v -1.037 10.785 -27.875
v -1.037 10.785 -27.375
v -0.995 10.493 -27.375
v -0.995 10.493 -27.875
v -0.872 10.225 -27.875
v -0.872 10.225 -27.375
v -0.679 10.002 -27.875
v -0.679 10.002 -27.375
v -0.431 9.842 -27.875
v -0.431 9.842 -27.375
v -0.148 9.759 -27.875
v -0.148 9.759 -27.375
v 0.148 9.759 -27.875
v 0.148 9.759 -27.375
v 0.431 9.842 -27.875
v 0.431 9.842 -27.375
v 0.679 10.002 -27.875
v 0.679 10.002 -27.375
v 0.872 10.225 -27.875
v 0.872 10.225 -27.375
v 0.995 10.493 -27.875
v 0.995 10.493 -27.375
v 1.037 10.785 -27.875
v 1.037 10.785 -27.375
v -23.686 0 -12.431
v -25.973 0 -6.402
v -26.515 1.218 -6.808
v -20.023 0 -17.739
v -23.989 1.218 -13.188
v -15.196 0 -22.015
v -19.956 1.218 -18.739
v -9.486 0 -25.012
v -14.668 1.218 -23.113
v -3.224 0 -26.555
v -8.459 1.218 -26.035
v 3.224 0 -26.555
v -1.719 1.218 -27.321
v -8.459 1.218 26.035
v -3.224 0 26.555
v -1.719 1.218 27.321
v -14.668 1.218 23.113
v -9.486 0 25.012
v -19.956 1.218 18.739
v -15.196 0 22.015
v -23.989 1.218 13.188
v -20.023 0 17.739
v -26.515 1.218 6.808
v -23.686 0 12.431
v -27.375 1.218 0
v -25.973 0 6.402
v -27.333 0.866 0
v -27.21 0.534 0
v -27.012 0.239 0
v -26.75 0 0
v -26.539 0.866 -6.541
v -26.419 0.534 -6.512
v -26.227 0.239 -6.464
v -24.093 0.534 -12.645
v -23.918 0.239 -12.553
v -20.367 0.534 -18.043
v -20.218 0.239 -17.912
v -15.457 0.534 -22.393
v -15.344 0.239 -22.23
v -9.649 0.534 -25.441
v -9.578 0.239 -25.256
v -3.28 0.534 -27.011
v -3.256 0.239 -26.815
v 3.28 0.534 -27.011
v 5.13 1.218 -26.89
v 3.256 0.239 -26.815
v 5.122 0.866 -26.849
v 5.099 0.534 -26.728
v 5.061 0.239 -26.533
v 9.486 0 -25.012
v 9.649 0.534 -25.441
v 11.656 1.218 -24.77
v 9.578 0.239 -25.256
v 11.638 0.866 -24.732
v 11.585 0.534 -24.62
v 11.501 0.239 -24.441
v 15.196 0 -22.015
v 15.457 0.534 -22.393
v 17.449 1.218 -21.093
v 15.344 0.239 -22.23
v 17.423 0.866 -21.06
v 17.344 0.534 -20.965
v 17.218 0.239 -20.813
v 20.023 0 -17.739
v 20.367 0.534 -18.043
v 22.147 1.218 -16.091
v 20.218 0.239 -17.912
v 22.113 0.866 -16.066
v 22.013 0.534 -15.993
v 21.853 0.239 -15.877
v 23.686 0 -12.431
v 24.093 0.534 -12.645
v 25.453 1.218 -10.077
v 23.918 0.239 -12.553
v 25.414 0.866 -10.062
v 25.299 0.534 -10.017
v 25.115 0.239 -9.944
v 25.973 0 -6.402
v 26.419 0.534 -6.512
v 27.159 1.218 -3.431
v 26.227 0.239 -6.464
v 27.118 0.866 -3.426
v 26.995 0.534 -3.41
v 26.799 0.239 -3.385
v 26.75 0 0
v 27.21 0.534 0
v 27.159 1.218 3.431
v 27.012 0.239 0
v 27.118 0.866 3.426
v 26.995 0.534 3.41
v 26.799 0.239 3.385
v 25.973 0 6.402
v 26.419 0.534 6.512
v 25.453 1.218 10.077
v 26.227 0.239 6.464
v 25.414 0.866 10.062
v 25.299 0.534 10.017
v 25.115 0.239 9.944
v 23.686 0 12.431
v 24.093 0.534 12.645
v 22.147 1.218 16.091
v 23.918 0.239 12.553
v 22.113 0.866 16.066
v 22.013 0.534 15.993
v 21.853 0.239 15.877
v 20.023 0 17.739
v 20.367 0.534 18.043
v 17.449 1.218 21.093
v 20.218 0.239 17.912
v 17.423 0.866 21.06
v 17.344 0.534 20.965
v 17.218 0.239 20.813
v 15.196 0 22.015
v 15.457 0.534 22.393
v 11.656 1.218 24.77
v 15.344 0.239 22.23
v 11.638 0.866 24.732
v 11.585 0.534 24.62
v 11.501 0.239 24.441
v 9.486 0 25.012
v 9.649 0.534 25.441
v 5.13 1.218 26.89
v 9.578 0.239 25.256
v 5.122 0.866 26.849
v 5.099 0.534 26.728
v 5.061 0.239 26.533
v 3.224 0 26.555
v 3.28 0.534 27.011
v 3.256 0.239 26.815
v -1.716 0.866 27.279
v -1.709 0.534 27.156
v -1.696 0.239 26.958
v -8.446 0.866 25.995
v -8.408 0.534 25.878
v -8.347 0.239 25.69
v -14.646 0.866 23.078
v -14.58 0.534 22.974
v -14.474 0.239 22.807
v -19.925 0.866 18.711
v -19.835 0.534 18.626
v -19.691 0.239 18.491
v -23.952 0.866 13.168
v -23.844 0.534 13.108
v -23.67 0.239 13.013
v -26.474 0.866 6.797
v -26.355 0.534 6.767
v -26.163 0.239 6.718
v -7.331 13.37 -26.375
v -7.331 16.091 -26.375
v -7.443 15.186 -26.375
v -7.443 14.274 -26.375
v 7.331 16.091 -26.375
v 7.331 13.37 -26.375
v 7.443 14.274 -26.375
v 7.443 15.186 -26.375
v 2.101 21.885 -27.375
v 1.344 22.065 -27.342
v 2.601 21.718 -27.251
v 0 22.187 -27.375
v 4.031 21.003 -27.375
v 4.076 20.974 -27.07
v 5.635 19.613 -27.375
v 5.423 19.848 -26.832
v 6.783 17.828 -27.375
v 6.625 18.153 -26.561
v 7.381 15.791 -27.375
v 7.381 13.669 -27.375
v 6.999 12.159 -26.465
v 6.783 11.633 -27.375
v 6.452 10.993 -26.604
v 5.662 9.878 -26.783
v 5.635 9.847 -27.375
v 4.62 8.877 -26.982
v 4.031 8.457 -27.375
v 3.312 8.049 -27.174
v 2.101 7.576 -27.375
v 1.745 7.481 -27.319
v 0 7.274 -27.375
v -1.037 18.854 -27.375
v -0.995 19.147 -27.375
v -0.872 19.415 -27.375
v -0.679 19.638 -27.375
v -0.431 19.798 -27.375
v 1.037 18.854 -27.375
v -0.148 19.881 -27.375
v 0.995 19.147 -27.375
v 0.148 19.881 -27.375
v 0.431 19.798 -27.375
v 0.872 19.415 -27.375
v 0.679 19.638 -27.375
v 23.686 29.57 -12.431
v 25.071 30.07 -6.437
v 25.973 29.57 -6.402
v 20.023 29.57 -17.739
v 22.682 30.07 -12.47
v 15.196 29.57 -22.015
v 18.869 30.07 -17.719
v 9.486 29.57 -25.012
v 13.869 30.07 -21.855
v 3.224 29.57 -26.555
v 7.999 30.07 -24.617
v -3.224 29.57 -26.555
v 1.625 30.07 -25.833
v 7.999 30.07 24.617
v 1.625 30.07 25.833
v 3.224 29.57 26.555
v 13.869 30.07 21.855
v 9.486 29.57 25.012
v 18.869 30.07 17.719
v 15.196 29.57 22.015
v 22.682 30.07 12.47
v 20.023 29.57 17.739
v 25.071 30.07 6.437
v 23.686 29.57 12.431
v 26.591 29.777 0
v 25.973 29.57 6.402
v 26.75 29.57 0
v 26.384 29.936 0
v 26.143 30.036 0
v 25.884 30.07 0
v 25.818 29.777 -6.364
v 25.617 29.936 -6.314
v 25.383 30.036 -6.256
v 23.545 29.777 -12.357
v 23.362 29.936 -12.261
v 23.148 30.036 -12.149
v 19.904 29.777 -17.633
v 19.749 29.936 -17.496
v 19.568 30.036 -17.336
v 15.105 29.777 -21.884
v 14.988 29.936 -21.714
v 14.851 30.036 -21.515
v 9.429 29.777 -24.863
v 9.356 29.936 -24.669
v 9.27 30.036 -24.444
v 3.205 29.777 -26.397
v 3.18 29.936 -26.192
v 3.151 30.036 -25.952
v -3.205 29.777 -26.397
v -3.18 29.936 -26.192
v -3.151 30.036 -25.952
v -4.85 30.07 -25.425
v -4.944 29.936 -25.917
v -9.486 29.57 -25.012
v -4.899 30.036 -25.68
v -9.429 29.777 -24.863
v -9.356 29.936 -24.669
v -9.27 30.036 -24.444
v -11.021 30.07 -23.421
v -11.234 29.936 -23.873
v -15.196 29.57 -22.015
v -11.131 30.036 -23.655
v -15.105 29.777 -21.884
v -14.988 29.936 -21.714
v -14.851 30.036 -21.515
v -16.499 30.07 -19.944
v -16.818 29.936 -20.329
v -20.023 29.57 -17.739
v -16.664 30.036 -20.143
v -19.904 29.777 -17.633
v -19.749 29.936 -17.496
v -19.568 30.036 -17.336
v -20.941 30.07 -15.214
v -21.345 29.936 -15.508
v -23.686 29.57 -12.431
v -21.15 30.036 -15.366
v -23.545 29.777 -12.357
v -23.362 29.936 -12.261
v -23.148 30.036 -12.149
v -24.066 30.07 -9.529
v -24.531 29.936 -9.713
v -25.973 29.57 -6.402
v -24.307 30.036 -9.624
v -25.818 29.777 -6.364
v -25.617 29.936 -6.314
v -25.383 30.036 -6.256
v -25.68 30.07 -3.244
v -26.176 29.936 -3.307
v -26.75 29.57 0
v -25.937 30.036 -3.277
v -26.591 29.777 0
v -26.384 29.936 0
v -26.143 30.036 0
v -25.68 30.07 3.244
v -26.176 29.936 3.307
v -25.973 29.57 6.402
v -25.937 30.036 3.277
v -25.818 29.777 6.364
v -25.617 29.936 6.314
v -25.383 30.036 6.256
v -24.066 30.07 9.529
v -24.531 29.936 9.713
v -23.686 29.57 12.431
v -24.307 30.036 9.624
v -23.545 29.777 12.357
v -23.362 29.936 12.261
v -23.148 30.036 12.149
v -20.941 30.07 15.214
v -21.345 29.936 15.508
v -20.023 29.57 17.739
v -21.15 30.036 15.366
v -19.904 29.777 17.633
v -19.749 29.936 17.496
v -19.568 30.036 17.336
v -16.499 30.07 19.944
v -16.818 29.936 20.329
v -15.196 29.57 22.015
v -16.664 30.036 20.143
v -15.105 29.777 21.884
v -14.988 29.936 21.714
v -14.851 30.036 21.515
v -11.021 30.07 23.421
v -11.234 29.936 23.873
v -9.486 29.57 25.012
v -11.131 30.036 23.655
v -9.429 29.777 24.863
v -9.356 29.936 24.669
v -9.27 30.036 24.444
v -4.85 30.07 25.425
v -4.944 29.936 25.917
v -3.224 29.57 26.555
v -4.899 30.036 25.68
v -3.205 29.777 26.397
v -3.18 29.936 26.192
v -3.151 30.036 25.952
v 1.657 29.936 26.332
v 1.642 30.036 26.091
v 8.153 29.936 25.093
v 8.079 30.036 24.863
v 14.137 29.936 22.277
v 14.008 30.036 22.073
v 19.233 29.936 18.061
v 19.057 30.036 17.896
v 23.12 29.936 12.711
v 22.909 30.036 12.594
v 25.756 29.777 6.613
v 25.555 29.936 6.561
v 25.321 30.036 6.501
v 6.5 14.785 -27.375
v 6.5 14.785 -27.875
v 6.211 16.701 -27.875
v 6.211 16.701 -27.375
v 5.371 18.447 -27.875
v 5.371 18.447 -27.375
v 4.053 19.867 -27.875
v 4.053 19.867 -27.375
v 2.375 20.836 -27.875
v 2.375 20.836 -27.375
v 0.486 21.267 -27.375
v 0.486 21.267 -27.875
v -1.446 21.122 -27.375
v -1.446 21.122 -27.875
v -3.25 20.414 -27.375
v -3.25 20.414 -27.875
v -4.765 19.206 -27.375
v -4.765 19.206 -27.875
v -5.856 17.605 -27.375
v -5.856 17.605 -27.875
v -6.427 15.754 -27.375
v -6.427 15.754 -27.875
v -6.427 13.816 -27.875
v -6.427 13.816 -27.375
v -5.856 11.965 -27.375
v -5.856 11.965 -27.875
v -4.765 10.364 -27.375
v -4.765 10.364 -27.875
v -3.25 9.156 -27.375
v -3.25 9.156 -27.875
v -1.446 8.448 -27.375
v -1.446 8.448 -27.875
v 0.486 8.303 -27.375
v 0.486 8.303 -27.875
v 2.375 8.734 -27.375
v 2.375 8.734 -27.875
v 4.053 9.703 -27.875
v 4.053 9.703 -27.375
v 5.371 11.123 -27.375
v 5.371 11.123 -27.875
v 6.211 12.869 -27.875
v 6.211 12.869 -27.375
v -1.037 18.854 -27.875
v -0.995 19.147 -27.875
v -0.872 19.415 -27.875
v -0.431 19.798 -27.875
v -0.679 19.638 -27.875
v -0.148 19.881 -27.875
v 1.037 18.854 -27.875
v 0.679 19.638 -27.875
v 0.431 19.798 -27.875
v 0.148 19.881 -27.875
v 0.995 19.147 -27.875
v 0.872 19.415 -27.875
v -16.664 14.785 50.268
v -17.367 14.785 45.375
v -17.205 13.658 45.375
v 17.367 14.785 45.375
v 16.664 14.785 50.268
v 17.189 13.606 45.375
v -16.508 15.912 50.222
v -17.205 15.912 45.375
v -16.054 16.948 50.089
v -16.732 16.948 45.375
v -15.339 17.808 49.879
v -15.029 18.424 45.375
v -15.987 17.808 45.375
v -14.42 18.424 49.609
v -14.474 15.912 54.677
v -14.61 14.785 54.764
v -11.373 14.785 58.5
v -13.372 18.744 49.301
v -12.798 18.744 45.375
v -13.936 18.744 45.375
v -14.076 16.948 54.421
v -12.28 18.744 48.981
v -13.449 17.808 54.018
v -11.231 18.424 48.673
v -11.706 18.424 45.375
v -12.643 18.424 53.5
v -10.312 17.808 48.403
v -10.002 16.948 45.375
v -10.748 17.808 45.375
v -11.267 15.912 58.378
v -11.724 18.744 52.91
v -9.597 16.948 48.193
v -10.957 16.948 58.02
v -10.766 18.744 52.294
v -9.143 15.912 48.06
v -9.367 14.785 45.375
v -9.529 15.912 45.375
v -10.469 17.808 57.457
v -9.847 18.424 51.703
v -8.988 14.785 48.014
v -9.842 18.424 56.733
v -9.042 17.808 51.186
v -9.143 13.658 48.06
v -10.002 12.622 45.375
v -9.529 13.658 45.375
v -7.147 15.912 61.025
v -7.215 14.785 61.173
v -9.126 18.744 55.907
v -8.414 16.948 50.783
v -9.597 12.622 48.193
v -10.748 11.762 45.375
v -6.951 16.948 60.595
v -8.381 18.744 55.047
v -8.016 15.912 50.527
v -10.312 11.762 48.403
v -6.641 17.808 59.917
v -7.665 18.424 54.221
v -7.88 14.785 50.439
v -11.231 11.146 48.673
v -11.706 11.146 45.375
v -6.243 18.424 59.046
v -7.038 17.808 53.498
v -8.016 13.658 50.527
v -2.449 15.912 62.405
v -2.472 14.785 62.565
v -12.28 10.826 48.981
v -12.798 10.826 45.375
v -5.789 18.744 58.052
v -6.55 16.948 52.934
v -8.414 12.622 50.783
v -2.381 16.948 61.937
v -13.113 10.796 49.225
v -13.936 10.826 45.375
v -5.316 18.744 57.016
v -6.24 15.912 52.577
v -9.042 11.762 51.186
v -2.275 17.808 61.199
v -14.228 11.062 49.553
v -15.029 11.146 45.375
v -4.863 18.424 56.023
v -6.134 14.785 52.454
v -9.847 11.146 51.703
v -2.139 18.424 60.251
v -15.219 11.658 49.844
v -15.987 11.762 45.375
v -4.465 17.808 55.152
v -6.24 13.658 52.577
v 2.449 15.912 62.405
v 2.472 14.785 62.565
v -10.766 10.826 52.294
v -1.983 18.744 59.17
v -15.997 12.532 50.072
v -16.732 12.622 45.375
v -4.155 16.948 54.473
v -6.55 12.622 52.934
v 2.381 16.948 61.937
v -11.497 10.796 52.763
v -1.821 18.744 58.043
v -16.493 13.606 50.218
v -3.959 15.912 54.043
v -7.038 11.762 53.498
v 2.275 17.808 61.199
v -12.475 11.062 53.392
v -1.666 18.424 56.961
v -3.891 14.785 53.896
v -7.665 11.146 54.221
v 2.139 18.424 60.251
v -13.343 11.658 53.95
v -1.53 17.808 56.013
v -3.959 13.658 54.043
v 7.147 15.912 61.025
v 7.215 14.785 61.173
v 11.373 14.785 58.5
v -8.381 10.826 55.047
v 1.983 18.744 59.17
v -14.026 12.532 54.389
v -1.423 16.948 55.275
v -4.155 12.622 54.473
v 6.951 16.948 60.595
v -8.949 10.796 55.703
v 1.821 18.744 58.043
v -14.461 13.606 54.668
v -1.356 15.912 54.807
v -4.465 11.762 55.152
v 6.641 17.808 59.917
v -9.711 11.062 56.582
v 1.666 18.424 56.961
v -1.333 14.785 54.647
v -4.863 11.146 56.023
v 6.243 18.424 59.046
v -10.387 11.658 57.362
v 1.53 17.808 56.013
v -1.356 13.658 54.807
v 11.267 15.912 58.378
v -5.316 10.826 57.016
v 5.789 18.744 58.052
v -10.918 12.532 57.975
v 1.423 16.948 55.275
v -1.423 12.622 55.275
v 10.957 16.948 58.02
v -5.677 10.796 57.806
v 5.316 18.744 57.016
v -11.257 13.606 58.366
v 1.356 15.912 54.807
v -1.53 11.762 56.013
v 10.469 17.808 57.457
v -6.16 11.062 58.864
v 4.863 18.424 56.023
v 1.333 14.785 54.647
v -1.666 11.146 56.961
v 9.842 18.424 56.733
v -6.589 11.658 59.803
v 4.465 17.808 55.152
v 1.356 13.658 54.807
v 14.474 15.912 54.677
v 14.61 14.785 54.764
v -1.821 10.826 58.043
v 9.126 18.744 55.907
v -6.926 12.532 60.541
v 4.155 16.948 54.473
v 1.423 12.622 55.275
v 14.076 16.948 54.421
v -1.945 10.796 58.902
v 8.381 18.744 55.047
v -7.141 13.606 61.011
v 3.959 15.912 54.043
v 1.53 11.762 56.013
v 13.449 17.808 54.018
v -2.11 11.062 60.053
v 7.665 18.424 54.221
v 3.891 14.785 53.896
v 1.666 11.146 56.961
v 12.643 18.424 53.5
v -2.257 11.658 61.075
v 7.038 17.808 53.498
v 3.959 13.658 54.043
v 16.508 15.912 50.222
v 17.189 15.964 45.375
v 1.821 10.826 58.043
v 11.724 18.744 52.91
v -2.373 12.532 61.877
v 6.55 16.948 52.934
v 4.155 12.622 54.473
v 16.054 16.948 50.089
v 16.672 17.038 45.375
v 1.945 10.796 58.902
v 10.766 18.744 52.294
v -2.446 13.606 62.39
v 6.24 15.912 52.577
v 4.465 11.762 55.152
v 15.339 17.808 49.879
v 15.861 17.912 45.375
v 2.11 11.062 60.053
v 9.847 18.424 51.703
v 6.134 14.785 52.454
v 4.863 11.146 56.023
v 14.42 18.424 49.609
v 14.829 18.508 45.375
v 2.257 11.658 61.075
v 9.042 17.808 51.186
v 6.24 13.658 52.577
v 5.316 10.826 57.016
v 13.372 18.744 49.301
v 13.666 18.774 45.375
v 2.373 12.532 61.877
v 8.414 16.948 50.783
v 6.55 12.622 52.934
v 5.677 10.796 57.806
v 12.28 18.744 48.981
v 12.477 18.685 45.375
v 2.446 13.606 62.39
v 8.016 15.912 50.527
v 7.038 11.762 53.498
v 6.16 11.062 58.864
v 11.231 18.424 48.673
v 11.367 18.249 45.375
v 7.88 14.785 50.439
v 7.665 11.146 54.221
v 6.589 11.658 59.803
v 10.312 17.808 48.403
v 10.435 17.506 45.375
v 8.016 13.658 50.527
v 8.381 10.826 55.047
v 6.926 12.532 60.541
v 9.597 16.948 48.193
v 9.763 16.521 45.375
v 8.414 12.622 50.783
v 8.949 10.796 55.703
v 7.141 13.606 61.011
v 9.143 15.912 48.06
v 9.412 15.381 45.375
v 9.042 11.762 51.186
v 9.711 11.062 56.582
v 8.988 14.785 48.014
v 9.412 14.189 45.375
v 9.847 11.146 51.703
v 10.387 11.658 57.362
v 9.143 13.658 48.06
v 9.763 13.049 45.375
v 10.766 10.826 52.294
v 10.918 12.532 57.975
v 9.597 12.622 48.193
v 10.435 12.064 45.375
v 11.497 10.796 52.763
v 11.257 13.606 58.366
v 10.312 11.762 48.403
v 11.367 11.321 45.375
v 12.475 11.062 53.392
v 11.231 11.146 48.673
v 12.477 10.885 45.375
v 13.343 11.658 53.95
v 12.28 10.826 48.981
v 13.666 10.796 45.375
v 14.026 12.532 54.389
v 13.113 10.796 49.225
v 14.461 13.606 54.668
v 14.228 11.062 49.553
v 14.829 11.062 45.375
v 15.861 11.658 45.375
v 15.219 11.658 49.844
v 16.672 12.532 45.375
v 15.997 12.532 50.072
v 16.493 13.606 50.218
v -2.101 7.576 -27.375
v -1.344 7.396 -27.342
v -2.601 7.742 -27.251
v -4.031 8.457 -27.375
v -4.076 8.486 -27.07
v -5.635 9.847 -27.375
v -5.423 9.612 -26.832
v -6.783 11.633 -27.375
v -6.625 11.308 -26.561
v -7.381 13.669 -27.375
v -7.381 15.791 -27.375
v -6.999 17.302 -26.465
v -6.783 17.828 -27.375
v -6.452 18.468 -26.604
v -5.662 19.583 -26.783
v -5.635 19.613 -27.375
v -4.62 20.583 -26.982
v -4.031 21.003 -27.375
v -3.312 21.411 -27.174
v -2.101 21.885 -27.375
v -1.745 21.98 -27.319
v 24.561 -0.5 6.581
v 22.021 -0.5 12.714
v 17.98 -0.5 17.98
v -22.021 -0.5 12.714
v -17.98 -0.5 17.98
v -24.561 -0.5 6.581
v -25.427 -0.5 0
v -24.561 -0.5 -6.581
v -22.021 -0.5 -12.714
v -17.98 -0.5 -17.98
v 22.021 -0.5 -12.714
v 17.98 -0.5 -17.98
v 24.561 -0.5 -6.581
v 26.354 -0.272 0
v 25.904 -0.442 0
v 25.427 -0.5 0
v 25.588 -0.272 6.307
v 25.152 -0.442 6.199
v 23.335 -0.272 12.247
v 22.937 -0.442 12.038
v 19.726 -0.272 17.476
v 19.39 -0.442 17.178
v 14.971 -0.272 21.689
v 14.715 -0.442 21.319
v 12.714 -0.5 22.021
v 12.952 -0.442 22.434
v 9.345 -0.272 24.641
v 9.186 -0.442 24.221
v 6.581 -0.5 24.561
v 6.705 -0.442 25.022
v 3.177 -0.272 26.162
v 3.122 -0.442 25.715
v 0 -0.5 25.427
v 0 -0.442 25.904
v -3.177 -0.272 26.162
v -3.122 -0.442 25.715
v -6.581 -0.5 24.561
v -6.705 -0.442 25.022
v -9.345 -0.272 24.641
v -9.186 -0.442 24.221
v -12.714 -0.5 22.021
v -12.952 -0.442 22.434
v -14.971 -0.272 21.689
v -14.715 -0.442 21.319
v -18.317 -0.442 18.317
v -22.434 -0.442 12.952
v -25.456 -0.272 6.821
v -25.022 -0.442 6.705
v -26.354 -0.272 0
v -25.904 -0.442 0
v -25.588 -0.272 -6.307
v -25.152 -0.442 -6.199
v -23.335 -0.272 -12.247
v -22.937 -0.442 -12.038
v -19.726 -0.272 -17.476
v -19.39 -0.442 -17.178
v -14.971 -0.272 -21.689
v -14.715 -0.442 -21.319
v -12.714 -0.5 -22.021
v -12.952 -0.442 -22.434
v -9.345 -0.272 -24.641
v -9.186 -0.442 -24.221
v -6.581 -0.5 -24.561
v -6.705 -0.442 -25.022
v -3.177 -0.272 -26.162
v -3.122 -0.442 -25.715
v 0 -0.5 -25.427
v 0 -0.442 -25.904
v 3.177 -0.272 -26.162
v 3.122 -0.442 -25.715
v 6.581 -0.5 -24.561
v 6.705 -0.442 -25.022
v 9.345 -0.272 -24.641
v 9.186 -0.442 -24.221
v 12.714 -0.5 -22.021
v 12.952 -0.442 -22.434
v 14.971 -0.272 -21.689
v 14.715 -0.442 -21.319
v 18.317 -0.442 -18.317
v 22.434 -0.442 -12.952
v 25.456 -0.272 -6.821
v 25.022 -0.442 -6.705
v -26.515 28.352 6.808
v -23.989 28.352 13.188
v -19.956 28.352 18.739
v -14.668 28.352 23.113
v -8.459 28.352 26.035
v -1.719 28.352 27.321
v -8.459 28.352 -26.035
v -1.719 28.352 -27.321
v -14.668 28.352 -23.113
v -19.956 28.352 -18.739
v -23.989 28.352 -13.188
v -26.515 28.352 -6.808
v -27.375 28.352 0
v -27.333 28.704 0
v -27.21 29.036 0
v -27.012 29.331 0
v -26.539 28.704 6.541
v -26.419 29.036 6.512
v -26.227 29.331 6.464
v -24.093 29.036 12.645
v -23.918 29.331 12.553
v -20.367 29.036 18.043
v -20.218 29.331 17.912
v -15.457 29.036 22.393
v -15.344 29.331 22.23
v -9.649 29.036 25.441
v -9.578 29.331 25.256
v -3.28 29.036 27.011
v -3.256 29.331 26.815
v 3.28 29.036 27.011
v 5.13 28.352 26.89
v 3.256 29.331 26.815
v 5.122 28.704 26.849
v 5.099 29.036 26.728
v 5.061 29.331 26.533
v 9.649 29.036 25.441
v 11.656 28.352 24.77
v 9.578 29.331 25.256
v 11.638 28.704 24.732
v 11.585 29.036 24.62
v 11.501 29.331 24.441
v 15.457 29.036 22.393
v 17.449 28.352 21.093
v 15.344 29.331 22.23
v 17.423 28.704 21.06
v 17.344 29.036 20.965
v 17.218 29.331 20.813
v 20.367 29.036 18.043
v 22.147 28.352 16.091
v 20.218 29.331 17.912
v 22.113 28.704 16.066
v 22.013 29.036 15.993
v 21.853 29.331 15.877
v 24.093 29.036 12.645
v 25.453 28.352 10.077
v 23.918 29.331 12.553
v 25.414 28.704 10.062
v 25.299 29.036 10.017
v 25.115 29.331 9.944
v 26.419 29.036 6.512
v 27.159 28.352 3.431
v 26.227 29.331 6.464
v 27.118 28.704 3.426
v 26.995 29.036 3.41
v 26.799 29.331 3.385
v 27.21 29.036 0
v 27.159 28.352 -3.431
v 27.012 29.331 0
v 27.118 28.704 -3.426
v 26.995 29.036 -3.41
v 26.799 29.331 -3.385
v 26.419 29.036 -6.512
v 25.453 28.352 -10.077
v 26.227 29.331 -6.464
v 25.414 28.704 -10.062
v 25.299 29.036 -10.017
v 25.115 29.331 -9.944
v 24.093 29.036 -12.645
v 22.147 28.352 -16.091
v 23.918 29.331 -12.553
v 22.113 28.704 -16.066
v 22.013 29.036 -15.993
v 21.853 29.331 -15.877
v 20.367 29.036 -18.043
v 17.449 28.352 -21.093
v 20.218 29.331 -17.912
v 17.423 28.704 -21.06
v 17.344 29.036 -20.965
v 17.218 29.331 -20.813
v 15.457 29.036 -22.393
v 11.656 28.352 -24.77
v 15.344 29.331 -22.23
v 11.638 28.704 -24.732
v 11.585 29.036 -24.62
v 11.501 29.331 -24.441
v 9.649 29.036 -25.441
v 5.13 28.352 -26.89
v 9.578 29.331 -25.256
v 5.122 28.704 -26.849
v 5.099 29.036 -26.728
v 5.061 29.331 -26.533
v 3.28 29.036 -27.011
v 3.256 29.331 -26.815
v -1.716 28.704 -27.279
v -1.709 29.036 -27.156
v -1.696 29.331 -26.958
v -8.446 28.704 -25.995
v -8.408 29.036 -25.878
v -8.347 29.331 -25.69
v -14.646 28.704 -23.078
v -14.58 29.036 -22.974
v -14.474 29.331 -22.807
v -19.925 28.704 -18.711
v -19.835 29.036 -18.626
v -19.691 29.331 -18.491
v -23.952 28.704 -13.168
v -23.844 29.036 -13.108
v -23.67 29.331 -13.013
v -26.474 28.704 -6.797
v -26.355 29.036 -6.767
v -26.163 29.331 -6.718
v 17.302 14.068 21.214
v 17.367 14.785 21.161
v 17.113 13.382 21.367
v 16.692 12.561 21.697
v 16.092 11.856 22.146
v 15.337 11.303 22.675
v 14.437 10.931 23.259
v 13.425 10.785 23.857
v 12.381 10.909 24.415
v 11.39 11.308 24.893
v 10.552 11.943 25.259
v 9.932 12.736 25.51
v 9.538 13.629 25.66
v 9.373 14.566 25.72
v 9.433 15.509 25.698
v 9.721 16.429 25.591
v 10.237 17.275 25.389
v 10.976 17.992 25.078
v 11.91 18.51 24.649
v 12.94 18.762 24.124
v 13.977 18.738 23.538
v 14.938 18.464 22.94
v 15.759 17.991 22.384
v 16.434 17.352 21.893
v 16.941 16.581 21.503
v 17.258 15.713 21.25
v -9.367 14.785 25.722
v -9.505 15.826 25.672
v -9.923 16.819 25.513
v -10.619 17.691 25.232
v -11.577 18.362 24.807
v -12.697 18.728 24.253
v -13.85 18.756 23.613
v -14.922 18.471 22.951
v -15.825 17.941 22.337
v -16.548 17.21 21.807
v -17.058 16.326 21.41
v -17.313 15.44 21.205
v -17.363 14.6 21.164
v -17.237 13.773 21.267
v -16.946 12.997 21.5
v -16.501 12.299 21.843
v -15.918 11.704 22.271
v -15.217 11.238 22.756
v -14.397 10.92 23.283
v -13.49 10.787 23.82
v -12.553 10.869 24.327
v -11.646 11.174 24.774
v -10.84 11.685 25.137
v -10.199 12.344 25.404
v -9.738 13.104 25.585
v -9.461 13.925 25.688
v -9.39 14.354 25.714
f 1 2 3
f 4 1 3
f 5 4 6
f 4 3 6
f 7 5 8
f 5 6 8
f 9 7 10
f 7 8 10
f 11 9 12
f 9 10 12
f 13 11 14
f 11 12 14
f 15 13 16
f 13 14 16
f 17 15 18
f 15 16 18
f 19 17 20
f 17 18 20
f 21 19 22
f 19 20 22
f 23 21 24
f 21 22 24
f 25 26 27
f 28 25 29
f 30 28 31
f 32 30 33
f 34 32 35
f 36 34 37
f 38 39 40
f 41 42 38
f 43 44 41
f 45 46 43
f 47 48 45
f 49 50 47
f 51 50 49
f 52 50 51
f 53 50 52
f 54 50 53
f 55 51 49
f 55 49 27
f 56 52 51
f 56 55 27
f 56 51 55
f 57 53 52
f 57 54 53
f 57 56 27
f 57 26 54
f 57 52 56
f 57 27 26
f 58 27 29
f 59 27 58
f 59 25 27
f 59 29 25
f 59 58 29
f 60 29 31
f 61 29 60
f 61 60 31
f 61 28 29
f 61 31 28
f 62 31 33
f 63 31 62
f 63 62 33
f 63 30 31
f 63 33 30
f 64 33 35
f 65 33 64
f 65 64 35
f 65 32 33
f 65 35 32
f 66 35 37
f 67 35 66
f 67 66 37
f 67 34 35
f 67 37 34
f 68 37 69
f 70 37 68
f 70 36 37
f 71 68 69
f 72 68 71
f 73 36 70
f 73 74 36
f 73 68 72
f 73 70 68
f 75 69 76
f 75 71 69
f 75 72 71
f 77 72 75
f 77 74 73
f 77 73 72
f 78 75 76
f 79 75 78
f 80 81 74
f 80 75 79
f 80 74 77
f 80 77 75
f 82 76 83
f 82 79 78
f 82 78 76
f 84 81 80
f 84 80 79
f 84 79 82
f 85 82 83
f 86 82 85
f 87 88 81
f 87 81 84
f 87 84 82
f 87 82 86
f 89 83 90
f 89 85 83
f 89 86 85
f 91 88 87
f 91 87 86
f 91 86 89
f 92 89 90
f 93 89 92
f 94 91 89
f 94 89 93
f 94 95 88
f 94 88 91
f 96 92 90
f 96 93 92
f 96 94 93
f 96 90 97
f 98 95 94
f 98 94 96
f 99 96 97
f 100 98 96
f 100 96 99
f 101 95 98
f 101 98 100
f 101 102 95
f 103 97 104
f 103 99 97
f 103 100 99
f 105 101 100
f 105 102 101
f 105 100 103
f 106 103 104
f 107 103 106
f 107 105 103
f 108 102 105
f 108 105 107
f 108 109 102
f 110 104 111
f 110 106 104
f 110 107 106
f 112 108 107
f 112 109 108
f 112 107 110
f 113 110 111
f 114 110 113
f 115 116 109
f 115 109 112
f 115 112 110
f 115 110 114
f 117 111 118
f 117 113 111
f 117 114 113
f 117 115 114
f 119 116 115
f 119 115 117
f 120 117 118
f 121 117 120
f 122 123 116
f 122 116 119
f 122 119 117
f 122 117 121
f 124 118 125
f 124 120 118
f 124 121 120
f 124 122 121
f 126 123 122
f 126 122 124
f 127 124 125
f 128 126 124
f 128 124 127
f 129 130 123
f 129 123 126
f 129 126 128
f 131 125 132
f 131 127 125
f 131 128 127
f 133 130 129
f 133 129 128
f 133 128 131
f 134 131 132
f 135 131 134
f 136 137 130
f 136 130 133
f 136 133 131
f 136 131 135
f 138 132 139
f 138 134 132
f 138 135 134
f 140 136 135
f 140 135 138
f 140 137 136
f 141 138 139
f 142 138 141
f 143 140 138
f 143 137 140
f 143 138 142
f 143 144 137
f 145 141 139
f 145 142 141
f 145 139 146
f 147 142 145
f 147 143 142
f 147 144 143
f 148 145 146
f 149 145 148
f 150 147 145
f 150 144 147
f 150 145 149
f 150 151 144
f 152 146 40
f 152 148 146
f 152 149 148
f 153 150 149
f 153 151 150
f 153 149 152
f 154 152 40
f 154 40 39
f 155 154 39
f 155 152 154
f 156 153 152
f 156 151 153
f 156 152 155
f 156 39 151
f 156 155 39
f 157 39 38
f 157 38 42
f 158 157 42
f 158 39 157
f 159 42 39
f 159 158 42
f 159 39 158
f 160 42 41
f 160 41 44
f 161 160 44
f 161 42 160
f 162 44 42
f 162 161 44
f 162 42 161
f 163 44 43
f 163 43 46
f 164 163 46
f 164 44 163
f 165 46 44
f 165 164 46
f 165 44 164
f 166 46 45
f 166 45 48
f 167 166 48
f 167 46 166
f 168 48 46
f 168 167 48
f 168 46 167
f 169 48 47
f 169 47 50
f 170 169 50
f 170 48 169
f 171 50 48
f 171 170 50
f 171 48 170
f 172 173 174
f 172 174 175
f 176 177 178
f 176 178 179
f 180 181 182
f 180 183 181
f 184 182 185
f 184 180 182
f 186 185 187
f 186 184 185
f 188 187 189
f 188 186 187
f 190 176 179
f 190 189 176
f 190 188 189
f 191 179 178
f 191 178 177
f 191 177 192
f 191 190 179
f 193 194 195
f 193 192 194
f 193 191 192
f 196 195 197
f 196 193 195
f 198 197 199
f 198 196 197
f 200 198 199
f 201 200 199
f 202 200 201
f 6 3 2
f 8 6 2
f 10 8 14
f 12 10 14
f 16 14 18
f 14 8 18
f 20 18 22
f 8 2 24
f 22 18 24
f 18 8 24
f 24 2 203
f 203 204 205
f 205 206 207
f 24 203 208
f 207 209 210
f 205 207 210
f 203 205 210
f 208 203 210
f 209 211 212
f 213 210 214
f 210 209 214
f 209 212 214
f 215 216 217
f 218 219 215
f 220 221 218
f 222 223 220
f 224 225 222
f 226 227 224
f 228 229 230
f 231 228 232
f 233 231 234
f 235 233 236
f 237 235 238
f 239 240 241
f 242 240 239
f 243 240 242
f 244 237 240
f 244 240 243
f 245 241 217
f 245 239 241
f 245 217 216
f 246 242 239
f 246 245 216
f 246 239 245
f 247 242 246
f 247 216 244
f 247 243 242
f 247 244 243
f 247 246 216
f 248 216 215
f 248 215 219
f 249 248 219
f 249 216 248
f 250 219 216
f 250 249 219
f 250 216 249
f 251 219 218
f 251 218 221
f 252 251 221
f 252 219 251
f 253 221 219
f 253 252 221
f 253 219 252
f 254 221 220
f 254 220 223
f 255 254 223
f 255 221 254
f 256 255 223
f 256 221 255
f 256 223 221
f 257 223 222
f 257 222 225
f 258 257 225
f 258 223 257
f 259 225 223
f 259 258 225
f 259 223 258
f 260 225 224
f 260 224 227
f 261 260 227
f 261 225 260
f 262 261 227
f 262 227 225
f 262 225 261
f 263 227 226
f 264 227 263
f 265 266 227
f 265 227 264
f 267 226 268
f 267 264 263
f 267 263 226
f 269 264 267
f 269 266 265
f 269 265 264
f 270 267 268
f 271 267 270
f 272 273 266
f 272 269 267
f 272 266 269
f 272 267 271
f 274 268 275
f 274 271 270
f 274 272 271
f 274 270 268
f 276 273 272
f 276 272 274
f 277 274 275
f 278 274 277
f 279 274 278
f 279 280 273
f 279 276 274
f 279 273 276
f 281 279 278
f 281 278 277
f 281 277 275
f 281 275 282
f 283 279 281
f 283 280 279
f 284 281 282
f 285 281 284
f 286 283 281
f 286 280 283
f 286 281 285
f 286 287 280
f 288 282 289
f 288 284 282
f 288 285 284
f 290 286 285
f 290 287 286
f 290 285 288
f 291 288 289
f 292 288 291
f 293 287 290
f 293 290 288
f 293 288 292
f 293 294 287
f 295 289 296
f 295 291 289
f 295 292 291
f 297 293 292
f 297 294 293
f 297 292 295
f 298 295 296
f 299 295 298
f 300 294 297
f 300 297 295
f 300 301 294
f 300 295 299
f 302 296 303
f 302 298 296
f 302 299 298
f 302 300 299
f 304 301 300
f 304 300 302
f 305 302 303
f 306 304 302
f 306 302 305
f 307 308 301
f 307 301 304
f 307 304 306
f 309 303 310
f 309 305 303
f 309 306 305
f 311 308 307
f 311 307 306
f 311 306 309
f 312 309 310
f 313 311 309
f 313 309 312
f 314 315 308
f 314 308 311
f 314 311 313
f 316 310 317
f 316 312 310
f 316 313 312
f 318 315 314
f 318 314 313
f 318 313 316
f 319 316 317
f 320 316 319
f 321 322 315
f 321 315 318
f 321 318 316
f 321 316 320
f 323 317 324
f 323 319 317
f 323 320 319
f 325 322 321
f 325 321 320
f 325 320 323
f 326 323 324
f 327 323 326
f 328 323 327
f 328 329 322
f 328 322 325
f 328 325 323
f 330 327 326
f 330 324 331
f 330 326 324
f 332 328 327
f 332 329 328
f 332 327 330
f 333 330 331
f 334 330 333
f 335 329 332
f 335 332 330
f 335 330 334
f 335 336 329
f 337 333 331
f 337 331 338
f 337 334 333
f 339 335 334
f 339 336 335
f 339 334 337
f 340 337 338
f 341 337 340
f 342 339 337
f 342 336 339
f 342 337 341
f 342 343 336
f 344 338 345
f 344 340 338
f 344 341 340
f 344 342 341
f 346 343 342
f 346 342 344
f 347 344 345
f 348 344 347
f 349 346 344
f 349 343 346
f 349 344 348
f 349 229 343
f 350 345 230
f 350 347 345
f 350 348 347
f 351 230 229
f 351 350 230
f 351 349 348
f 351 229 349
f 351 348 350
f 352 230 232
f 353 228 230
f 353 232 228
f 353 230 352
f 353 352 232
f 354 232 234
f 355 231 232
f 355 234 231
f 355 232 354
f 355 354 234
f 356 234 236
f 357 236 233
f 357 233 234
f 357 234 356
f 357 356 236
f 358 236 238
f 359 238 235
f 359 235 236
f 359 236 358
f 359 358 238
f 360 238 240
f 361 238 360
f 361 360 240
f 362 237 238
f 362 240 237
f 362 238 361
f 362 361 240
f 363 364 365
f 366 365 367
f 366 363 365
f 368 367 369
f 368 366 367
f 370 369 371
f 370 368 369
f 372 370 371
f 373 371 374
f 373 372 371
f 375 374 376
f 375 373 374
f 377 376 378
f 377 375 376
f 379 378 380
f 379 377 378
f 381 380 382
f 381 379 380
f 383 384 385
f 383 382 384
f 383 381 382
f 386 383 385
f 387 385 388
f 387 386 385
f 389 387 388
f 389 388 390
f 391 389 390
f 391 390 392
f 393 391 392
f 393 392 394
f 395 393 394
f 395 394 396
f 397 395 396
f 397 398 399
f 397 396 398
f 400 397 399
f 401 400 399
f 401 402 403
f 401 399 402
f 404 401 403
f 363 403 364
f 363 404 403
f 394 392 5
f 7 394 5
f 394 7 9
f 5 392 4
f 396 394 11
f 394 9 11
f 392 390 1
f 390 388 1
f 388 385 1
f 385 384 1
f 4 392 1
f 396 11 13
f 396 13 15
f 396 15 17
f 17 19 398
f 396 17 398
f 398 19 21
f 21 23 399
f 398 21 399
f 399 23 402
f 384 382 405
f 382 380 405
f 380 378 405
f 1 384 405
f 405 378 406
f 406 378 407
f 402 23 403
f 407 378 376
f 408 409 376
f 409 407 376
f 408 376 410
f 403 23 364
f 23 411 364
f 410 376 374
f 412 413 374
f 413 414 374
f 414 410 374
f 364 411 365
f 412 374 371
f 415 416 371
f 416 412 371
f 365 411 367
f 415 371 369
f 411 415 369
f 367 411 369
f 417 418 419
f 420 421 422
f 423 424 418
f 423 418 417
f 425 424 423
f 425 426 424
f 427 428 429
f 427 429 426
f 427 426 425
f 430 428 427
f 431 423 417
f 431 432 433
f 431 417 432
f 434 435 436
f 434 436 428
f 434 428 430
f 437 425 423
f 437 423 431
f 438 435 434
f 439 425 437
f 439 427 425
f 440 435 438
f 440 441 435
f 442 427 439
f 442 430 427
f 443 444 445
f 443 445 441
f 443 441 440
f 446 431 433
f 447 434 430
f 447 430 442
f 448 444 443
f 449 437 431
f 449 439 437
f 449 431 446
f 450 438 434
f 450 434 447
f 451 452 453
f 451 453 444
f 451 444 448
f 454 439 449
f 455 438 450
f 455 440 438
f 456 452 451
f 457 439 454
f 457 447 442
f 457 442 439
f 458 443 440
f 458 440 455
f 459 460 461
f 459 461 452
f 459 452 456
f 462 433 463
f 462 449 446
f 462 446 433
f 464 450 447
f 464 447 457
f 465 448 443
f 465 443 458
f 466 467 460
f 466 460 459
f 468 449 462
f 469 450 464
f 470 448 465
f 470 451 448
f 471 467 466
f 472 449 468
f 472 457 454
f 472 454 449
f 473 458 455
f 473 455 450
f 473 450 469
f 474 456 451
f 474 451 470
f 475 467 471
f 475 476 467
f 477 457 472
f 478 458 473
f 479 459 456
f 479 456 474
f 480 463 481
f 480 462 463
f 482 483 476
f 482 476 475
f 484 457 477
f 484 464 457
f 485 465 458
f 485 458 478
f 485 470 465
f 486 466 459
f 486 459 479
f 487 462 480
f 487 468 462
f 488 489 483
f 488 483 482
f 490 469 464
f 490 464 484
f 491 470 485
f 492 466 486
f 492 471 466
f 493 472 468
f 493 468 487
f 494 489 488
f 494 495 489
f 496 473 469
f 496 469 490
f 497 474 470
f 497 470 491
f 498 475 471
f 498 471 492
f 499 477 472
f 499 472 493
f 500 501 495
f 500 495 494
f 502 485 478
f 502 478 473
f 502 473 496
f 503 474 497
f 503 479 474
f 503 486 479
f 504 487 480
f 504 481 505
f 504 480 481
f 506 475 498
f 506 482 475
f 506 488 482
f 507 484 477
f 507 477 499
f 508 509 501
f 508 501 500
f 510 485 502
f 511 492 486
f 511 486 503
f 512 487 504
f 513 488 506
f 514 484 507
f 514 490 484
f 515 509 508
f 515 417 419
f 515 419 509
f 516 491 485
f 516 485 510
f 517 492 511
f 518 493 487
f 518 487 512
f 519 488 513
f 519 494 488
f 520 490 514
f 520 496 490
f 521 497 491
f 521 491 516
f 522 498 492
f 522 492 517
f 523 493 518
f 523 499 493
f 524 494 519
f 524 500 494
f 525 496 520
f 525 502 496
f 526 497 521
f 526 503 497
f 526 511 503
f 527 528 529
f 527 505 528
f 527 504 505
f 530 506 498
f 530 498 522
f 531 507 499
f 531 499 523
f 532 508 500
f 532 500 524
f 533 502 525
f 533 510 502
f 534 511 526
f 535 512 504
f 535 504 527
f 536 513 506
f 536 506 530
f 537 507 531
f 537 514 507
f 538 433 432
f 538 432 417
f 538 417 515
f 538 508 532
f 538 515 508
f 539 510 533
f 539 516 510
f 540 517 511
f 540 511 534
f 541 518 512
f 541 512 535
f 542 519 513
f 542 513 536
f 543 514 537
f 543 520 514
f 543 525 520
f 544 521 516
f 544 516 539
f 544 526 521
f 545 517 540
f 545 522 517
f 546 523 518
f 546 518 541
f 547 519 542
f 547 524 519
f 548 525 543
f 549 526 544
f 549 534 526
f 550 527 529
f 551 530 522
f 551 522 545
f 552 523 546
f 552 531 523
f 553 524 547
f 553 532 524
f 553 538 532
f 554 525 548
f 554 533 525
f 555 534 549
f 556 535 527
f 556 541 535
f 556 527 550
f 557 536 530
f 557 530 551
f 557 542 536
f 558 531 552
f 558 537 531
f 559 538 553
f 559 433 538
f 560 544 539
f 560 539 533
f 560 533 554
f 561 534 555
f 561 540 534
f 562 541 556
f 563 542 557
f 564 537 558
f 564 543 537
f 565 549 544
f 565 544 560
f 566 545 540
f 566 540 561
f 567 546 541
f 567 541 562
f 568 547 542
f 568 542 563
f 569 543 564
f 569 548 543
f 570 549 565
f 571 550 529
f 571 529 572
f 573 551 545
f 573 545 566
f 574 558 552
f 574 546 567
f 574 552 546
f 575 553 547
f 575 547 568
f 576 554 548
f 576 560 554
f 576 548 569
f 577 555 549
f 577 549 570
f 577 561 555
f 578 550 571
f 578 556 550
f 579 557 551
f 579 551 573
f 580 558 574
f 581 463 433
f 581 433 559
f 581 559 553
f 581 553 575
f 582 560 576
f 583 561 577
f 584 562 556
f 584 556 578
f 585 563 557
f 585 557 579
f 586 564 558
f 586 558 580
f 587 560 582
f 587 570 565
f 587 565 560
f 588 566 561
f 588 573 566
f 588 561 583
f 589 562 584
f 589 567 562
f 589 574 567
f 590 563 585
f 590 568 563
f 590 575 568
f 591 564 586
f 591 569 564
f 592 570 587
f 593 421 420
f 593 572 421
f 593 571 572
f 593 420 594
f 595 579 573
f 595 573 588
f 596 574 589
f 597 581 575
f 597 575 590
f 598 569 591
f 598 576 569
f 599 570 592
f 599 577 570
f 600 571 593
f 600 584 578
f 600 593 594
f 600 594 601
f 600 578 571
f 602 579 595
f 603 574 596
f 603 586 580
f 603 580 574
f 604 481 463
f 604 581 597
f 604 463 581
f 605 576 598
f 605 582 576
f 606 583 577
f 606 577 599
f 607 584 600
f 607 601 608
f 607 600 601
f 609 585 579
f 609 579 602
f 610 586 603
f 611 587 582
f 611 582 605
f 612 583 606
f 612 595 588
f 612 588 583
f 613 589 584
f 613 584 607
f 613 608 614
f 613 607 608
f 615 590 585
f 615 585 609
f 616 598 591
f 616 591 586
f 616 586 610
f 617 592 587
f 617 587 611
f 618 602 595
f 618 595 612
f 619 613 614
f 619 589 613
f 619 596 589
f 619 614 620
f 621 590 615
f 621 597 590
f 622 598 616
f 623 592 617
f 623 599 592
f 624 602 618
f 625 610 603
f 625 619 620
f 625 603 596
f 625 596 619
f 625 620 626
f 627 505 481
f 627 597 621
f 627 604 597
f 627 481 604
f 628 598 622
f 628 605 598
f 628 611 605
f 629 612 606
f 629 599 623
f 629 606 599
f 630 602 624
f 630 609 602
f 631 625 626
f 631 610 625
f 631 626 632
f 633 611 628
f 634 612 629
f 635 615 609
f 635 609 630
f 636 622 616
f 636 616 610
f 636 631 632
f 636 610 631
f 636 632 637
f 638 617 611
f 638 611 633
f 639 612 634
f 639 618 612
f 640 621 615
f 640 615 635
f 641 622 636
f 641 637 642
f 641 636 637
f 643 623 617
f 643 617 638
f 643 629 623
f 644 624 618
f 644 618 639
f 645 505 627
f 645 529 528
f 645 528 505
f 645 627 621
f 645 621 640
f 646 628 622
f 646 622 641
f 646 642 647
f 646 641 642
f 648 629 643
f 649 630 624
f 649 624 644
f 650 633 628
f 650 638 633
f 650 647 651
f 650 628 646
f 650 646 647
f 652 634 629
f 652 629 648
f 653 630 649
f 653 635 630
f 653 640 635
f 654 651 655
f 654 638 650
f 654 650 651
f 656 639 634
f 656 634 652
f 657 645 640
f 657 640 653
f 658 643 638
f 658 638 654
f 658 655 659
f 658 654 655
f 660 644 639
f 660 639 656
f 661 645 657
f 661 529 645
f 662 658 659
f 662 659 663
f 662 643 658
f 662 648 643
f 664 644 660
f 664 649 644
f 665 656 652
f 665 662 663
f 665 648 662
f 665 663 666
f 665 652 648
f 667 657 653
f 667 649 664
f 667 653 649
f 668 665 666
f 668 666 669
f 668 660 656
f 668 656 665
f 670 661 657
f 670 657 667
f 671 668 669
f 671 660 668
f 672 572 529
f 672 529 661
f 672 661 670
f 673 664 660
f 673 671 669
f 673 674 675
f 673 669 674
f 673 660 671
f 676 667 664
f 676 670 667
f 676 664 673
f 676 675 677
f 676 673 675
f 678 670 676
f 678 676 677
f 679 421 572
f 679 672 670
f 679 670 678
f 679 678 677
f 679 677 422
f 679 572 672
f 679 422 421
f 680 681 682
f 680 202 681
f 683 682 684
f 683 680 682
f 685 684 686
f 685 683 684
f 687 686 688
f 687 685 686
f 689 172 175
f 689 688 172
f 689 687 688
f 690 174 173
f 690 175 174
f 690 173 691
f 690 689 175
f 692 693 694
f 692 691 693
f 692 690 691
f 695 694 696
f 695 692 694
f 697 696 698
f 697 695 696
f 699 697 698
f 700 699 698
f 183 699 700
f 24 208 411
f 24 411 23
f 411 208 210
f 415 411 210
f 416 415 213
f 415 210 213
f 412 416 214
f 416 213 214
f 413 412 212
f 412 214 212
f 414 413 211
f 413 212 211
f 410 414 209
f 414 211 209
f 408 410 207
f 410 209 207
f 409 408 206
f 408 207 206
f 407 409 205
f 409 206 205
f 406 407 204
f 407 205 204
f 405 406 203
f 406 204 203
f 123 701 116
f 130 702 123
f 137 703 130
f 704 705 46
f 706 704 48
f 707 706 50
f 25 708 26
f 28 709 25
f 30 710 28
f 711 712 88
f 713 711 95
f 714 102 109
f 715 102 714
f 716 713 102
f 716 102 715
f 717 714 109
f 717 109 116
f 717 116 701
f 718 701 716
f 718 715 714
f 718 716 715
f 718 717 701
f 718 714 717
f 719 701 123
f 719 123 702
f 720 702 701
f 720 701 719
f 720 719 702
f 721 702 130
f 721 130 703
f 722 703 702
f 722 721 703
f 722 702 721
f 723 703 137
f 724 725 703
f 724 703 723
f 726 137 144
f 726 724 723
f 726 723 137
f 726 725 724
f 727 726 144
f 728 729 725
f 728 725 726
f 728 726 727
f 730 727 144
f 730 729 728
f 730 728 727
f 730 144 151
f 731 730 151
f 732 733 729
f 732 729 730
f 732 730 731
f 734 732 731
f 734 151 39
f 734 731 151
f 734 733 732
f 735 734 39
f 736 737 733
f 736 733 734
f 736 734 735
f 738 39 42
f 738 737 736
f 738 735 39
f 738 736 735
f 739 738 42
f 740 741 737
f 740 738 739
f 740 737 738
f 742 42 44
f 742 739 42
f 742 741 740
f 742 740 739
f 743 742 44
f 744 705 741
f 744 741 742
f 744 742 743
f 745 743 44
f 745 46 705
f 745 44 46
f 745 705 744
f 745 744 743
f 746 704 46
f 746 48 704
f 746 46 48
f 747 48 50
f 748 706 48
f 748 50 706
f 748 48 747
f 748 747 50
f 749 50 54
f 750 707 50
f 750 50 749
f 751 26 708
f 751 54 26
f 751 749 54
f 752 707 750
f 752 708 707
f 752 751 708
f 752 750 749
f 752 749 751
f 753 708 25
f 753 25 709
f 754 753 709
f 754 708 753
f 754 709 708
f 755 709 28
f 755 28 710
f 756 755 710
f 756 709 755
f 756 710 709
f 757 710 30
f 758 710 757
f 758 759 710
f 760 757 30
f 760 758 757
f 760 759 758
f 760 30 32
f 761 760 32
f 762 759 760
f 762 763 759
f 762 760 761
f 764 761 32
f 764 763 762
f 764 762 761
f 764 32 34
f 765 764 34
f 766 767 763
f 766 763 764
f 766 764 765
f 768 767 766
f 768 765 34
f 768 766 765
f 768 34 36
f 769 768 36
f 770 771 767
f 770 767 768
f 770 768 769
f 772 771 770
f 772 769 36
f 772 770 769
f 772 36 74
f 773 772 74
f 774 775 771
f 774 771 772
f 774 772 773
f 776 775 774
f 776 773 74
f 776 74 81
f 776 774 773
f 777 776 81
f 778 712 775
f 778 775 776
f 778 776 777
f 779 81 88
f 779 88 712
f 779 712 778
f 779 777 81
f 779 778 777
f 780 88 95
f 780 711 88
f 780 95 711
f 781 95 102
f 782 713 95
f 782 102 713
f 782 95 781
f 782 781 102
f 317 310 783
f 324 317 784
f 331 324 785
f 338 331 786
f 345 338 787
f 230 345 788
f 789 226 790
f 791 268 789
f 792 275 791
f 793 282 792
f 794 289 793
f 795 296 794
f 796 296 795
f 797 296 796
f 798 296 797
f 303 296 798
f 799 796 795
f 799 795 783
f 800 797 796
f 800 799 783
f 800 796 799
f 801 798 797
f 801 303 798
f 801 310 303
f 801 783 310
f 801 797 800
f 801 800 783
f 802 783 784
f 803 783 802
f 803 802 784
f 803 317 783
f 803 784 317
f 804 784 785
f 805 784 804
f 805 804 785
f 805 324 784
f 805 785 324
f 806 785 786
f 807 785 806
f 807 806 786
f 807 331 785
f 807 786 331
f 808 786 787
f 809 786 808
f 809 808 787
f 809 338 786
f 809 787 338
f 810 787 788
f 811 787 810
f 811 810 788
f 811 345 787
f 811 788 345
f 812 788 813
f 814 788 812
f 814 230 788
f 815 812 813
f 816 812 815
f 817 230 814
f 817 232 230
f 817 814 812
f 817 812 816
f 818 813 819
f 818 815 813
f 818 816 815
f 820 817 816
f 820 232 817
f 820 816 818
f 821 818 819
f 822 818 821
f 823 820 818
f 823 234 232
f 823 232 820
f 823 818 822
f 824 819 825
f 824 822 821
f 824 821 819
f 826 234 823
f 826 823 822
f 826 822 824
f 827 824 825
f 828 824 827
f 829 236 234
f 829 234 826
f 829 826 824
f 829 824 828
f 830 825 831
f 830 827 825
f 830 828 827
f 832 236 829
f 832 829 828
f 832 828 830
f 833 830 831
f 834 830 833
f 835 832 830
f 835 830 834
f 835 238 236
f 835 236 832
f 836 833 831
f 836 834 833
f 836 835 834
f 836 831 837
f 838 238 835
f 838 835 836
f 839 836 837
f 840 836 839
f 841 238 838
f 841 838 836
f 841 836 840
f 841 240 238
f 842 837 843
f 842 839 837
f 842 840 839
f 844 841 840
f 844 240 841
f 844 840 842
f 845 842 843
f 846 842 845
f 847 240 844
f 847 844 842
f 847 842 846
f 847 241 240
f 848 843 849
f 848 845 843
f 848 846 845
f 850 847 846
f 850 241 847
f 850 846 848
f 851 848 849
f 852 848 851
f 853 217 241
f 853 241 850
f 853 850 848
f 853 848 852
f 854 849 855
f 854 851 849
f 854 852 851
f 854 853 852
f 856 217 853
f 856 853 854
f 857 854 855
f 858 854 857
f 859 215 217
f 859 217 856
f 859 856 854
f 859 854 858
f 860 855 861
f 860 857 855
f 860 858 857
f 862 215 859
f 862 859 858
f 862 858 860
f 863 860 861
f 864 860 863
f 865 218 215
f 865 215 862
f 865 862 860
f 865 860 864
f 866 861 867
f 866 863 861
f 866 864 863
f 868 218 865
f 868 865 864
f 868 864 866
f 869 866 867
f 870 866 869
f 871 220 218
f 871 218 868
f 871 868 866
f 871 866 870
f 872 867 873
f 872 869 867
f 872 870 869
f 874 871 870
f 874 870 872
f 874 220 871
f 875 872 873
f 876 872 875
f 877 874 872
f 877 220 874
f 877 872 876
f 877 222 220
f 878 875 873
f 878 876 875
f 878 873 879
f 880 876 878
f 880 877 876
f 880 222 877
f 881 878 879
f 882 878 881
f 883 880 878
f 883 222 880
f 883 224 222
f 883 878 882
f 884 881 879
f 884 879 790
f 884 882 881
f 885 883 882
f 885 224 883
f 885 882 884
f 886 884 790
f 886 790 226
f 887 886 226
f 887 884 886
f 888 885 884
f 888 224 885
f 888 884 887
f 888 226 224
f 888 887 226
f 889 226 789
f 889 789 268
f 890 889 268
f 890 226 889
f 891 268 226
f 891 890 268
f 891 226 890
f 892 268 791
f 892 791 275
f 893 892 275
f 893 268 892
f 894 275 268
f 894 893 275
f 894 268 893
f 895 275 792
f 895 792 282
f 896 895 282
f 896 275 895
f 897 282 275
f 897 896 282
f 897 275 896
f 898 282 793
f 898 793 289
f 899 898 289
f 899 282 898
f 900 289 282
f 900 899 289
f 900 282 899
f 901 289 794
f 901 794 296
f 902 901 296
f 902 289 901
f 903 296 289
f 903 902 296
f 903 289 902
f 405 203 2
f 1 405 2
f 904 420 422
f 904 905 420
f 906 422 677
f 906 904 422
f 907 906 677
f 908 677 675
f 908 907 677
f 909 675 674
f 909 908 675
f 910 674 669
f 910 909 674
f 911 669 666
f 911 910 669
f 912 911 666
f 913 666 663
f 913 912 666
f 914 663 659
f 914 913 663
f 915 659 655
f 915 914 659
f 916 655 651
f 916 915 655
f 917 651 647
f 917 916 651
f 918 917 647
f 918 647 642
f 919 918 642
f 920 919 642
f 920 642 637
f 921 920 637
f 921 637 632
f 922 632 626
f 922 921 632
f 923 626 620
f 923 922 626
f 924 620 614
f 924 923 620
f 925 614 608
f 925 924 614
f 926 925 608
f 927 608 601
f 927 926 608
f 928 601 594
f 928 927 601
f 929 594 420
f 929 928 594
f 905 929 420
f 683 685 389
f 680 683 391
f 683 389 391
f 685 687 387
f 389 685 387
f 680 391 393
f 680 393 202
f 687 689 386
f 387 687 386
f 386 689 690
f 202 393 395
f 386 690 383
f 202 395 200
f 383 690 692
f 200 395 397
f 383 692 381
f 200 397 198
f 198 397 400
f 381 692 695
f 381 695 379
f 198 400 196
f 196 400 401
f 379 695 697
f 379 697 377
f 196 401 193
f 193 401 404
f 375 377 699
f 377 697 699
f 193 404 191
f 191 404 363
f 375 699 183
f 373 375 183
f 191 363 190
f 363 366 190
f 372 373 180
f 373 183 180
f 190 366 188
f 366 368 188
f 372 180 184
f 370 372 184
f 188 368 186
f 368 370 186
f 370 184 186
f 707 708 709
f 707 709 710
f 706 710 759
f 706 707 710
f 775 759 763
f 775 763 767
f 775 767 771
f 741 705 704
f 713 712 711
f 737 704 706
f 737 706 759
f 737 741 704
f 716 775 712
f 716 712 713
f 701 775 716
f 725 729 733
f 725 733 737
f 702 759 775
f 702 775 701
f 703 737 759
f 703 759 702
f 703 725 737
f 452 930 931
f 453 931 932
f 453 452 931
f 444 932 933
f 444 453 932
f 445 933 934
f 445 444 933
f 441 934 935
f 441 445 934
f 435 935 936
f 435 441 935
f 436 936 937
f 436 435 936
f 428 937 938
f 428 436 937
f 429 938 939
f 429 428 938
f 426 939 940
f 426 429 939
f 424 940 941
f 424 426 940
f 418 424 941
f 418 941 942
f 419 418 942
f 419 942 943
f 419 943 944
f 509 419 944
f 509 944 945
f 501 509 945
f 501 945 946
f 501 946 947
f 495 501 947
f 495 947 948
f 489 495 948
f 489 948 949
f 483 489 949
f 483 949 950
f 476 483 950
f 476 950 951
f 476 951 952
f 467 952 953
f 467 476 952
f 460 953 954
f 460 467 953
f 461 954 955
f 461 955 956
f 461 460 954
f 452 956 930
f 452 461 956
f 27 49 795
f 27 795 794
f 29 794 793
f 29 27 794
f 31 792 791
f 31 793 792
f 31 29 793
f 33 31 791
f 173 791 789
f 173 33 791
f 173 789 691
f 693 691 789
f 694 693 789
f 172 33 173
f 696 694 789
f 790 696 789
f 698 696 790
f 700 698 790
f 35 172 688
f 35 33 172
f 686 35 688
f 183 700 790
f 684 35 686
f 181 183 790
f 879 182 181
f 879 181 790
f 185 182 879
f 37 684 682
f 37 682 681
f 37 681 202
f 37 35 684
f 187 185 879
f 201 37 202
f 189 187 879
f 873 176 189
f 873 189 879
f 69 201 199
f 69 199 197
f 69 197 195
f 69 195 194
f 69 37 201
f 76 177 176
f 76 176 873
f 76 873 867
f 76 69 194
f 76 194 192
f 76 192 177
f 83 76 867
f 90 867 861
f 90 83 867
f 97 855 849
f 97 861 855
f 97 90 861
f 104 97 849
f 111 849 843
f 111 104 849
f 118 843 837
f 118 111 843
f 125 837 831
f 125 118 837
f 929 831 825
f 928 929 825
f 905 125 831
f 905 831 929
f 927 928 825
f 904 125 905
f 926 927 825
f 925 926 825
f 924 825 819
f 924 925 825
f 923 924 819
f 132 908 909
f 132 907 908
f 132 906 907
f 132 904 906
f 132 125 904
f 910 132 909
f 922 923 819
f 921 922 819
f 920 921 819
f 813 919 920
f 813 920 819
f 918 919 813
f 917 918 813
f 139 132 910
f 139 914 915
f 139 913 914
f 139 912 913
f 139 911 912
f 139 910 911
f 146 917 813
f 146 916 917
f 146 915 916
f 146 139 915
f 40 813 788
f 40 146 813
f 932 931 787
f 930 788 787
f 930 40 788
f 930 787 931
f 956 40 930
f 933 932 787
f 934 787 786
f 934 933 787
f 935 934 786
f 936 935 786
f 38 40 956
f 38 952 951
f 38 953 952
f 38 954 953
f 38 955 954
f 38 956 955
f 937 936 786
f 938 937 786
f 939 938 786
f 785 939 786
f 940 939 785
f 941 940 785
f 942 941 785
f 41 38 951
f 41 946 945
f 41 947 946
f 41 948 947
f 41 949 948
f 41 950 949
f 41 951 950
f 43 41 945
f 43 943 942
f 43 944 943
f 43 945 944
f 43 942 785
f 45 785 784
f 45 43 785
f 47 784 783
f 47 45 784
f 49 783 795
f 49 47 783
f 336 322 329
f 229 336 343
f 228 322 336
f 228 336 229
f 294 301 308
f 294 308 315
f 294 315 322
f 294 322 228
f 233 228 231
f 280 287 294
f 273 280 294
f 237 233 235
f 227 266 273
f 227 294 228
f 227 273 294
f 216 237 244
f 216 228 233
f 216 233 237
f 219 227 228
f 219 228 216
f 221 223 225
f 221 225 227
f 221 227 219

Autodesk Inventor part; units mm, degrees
ref_plane "YZ Plane" through (0, 0, 0) normal (1, 0, 0) x (0, 1, 0)
sketch "Sketch1" plane through (0, 0, 0) normal (0, 1, 0) x (-1, 0, 0)
  circle A0 centre (0, 0) radius 27.375
  dimension "d0" = 54.75
extrude "Extrusion1" add sketch "Sketch1" along normal blind 29.57
sketch "Sketch2" plane through (0, 29.57, 0) normal (0, 1, 0) x (1, 0, 0)
  point P0 (0, 0)
ref_plane "Work Plane1" through (0, 0, 27.375) normal (0, 0, 1) x (1, 0, 0)
sketch "Sketch3" plane through (0, 0, 27.375) normal (0, 0, 1) x (1, 0, 0)
  line L0 (-27.375, 0) -> (27.375, 0) construction
  line L1 (27.375, 0) -> (27.375, 29.57) construction
  line L2 (27.375, 0) -> (27.375, 29.57) construction
  line L3 (27.375, 29.57) -> (-27.375, 29.57) construction
  line L4 (-17.35, 14.785) -> (17.35, 14.785)
  circle A0 centre (13.3672, 14.785) radius 4
  line L5 (0, 0) -> (0, 29.57) construction
  circle A1 centre (-13.3672, 14.785) radius 4
  point P0 (0, 0)
  point P1 (0, 14.785)
  dimension "d3" = 34.7
  dimension "d4" = 8
extrude "Extrusion2" add sketch "Sketch3" against normal blind 10 and the other way blind 18
sketch "Sketch4" plane through (13.3672, 14.785, 45.375) normal (0, 0, 1) x (1, 0, 0)
  line L0 (-13.3672, -26.0897) -> (-13.3672, 22.3589)
  point P0 (-13.3672, -14.785)
sketch "Sketch5" plane through (13.3672, 14.785, 45.375) normal (0, 0, 1) x (1, 0, 0)
  circle A0 centre (0, 0) radius 4
  line L0 (-13.3672, 32.0486) -> (-13.3672, -35.7794) projected
  point P0 (-13.3672, -14.785)
  dimension "d9" = 8
revolve "Revolution1" add sketch "Sketch5" angle 180 about axis through (0, 37.1439, 45.375) along (0, -1, 0)
sketch "Sketch8" plane through (0, 0, 0) normal (0, -1, 0) x (1, 0, 0)
  circle A0 centre (0, 0) radius 26.75
  dimension "d11" = 53.5
sketch "Sketch9" plane through (0, 29.57, 0) normal (0, 1, 0) x (1, 0, 0)
  circle A0 centre (0, 0) radius 26.75
  dimension "d12" = 53.5
extrude "Extrusion3" add sketch "Sketch9" along normal blind 0.5
extrude "Extrusion4" add sketch "Sketch8" along normal blind 0.5
fillet "Fillet1" radius 2 1 edges at (-26.75, -0.5, 0)
fillet "Fillet2" radius 1.5 1 edges at (27.375, 0, 0)
fillet "Fillet3" radius 1.5 1 edges at (27.375, 29.57, 0)
fillet "Fillet4" radius 1 1 edges at (-26.75, 30.07, 0)
ref_plane "Work Plane2" through (0, 0, -27.375) normal (0, 0, 1) x (1, 0, 0)
sketch "Sketch10" plane through (0, 0, -27.375) normal (0, 0, 1) x (1, 0, 0)
  line L0 (27.375, 28.3517) -> (-27.375, 28.3517) construction
  line L1 (27.3423, 28.3517) -> (-27.3423, 28.3517) construction
  line L2 (27.375, 28.3517) -> (27.375, 1.2183) construction
  line L3 (-27.375, 1.2183) -> (27.375, 1.2183) construction
  line L4 (27.375, 1.2183) -> (27.375, 28.3517) construction
  circle A0 centre (0, 14.785) radius 7.5
  circle A1 centre (0, 14.785) radius 6.5
  line L5 (1.0367, 18.8545) -> (1.0367, 10.785)
  line L6 (-13.3672, 10.785) -> (13.3672, 10.785) projected
  line L7 (0, 28.3517) -> (0, 1.2183) construction
  line L8 (-1.0367, 18.8545) -> (-1.0367, 10.785)
  arc A2 (1.0367, 18.8545) -> (-1.0367, 18.8545) centre (0, 18.8545) ccw construction
  arc A3 (-1.0367, 10.785) -> (1.0367, 10.785) centre (0, 10.785) ccw construction
  arc A4 (1.0367, 18.8545) -> (-1.0367, 18.8545) centre (0, 18.8545) ccw
  arc A5 (-1.0367, 10.785) -> (1.0367, 10.785) centre (0, 10.785) ccw
  point P0 (0, 0)
  point P1 (0, 14.785)
  point P2 (27.375, 14.785)
  dimension "d21" = 15
  dimension "d22" = 13
extrude "Extrusion5" add sketch "Sketch10" against normal blind 0.5 contours L6 A5 A1 | A1 L6 L5 A4 L8
sketch "Sketch11" plane through (0, 0, -27.375) normal (0, 0, 1) x (1, 0, 0)
  circle A0 centre (0, 14.7302) radius 7.4566
  point P0 (0, 0)
extrude "Extrusion6" add sketch "Sketch11" along normal blind 1
properties part number "Noke"
